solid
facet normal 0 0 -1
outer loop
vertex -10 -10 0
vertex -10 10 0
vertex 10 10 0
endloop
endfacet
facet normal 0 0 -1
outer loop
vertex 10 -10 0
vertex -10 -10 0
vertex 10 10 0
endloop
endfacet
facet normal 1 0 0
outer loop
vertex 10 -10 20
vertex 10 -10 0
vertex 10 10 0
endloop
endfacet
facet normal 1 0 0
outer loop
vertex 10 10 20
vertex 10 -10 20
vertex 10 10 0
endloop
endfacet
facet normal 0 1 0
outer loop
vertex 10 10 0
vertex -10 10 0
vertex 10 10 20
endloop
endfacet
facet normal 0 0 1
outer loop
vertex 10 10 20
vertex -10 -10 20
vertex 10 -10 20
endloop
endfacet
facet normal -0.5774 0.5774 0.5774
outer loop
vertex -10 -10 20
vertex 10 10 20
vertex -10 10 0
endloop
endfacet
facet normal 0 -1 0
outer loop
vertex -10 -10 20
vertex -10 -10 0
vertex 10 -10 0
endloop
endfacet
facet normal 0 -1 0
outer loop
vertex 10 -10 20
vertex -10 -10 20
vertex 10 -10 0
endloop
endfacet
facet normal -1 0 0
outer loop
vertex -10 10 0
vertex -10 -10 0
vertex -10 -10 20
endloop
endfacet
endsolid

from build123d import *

# Parameters (mm, degrees)
F0_W     = 20
F0_H     = 20
F1_DEPTH = 20
F4_DEPTH = 15


with BuildPart() as f1:
    # F0 (on Top) → F1 (new body)
    with BuildSketch(Plane.XY):
        Rectangle(F0_W, F0_H)
    extrude(amount=F1_DEPTH)

    # F3 (on 3pt) → F4 (cut, symmetric)
    with BuildSketch(Plane(origin=(0, 0, 0), x_dir=(-0.7071067812, 0.7071067812, 0), z_dir=(0.7071067812, 0.7071067812, 0))):
        Polygon((14.1421356237, 0), (14.1421356237, 20), (0, 20), align=None)
    extrude(amount=F4_DEPTH, both=True, mode=Mode.SUBTRACT)


solid = f1.part
